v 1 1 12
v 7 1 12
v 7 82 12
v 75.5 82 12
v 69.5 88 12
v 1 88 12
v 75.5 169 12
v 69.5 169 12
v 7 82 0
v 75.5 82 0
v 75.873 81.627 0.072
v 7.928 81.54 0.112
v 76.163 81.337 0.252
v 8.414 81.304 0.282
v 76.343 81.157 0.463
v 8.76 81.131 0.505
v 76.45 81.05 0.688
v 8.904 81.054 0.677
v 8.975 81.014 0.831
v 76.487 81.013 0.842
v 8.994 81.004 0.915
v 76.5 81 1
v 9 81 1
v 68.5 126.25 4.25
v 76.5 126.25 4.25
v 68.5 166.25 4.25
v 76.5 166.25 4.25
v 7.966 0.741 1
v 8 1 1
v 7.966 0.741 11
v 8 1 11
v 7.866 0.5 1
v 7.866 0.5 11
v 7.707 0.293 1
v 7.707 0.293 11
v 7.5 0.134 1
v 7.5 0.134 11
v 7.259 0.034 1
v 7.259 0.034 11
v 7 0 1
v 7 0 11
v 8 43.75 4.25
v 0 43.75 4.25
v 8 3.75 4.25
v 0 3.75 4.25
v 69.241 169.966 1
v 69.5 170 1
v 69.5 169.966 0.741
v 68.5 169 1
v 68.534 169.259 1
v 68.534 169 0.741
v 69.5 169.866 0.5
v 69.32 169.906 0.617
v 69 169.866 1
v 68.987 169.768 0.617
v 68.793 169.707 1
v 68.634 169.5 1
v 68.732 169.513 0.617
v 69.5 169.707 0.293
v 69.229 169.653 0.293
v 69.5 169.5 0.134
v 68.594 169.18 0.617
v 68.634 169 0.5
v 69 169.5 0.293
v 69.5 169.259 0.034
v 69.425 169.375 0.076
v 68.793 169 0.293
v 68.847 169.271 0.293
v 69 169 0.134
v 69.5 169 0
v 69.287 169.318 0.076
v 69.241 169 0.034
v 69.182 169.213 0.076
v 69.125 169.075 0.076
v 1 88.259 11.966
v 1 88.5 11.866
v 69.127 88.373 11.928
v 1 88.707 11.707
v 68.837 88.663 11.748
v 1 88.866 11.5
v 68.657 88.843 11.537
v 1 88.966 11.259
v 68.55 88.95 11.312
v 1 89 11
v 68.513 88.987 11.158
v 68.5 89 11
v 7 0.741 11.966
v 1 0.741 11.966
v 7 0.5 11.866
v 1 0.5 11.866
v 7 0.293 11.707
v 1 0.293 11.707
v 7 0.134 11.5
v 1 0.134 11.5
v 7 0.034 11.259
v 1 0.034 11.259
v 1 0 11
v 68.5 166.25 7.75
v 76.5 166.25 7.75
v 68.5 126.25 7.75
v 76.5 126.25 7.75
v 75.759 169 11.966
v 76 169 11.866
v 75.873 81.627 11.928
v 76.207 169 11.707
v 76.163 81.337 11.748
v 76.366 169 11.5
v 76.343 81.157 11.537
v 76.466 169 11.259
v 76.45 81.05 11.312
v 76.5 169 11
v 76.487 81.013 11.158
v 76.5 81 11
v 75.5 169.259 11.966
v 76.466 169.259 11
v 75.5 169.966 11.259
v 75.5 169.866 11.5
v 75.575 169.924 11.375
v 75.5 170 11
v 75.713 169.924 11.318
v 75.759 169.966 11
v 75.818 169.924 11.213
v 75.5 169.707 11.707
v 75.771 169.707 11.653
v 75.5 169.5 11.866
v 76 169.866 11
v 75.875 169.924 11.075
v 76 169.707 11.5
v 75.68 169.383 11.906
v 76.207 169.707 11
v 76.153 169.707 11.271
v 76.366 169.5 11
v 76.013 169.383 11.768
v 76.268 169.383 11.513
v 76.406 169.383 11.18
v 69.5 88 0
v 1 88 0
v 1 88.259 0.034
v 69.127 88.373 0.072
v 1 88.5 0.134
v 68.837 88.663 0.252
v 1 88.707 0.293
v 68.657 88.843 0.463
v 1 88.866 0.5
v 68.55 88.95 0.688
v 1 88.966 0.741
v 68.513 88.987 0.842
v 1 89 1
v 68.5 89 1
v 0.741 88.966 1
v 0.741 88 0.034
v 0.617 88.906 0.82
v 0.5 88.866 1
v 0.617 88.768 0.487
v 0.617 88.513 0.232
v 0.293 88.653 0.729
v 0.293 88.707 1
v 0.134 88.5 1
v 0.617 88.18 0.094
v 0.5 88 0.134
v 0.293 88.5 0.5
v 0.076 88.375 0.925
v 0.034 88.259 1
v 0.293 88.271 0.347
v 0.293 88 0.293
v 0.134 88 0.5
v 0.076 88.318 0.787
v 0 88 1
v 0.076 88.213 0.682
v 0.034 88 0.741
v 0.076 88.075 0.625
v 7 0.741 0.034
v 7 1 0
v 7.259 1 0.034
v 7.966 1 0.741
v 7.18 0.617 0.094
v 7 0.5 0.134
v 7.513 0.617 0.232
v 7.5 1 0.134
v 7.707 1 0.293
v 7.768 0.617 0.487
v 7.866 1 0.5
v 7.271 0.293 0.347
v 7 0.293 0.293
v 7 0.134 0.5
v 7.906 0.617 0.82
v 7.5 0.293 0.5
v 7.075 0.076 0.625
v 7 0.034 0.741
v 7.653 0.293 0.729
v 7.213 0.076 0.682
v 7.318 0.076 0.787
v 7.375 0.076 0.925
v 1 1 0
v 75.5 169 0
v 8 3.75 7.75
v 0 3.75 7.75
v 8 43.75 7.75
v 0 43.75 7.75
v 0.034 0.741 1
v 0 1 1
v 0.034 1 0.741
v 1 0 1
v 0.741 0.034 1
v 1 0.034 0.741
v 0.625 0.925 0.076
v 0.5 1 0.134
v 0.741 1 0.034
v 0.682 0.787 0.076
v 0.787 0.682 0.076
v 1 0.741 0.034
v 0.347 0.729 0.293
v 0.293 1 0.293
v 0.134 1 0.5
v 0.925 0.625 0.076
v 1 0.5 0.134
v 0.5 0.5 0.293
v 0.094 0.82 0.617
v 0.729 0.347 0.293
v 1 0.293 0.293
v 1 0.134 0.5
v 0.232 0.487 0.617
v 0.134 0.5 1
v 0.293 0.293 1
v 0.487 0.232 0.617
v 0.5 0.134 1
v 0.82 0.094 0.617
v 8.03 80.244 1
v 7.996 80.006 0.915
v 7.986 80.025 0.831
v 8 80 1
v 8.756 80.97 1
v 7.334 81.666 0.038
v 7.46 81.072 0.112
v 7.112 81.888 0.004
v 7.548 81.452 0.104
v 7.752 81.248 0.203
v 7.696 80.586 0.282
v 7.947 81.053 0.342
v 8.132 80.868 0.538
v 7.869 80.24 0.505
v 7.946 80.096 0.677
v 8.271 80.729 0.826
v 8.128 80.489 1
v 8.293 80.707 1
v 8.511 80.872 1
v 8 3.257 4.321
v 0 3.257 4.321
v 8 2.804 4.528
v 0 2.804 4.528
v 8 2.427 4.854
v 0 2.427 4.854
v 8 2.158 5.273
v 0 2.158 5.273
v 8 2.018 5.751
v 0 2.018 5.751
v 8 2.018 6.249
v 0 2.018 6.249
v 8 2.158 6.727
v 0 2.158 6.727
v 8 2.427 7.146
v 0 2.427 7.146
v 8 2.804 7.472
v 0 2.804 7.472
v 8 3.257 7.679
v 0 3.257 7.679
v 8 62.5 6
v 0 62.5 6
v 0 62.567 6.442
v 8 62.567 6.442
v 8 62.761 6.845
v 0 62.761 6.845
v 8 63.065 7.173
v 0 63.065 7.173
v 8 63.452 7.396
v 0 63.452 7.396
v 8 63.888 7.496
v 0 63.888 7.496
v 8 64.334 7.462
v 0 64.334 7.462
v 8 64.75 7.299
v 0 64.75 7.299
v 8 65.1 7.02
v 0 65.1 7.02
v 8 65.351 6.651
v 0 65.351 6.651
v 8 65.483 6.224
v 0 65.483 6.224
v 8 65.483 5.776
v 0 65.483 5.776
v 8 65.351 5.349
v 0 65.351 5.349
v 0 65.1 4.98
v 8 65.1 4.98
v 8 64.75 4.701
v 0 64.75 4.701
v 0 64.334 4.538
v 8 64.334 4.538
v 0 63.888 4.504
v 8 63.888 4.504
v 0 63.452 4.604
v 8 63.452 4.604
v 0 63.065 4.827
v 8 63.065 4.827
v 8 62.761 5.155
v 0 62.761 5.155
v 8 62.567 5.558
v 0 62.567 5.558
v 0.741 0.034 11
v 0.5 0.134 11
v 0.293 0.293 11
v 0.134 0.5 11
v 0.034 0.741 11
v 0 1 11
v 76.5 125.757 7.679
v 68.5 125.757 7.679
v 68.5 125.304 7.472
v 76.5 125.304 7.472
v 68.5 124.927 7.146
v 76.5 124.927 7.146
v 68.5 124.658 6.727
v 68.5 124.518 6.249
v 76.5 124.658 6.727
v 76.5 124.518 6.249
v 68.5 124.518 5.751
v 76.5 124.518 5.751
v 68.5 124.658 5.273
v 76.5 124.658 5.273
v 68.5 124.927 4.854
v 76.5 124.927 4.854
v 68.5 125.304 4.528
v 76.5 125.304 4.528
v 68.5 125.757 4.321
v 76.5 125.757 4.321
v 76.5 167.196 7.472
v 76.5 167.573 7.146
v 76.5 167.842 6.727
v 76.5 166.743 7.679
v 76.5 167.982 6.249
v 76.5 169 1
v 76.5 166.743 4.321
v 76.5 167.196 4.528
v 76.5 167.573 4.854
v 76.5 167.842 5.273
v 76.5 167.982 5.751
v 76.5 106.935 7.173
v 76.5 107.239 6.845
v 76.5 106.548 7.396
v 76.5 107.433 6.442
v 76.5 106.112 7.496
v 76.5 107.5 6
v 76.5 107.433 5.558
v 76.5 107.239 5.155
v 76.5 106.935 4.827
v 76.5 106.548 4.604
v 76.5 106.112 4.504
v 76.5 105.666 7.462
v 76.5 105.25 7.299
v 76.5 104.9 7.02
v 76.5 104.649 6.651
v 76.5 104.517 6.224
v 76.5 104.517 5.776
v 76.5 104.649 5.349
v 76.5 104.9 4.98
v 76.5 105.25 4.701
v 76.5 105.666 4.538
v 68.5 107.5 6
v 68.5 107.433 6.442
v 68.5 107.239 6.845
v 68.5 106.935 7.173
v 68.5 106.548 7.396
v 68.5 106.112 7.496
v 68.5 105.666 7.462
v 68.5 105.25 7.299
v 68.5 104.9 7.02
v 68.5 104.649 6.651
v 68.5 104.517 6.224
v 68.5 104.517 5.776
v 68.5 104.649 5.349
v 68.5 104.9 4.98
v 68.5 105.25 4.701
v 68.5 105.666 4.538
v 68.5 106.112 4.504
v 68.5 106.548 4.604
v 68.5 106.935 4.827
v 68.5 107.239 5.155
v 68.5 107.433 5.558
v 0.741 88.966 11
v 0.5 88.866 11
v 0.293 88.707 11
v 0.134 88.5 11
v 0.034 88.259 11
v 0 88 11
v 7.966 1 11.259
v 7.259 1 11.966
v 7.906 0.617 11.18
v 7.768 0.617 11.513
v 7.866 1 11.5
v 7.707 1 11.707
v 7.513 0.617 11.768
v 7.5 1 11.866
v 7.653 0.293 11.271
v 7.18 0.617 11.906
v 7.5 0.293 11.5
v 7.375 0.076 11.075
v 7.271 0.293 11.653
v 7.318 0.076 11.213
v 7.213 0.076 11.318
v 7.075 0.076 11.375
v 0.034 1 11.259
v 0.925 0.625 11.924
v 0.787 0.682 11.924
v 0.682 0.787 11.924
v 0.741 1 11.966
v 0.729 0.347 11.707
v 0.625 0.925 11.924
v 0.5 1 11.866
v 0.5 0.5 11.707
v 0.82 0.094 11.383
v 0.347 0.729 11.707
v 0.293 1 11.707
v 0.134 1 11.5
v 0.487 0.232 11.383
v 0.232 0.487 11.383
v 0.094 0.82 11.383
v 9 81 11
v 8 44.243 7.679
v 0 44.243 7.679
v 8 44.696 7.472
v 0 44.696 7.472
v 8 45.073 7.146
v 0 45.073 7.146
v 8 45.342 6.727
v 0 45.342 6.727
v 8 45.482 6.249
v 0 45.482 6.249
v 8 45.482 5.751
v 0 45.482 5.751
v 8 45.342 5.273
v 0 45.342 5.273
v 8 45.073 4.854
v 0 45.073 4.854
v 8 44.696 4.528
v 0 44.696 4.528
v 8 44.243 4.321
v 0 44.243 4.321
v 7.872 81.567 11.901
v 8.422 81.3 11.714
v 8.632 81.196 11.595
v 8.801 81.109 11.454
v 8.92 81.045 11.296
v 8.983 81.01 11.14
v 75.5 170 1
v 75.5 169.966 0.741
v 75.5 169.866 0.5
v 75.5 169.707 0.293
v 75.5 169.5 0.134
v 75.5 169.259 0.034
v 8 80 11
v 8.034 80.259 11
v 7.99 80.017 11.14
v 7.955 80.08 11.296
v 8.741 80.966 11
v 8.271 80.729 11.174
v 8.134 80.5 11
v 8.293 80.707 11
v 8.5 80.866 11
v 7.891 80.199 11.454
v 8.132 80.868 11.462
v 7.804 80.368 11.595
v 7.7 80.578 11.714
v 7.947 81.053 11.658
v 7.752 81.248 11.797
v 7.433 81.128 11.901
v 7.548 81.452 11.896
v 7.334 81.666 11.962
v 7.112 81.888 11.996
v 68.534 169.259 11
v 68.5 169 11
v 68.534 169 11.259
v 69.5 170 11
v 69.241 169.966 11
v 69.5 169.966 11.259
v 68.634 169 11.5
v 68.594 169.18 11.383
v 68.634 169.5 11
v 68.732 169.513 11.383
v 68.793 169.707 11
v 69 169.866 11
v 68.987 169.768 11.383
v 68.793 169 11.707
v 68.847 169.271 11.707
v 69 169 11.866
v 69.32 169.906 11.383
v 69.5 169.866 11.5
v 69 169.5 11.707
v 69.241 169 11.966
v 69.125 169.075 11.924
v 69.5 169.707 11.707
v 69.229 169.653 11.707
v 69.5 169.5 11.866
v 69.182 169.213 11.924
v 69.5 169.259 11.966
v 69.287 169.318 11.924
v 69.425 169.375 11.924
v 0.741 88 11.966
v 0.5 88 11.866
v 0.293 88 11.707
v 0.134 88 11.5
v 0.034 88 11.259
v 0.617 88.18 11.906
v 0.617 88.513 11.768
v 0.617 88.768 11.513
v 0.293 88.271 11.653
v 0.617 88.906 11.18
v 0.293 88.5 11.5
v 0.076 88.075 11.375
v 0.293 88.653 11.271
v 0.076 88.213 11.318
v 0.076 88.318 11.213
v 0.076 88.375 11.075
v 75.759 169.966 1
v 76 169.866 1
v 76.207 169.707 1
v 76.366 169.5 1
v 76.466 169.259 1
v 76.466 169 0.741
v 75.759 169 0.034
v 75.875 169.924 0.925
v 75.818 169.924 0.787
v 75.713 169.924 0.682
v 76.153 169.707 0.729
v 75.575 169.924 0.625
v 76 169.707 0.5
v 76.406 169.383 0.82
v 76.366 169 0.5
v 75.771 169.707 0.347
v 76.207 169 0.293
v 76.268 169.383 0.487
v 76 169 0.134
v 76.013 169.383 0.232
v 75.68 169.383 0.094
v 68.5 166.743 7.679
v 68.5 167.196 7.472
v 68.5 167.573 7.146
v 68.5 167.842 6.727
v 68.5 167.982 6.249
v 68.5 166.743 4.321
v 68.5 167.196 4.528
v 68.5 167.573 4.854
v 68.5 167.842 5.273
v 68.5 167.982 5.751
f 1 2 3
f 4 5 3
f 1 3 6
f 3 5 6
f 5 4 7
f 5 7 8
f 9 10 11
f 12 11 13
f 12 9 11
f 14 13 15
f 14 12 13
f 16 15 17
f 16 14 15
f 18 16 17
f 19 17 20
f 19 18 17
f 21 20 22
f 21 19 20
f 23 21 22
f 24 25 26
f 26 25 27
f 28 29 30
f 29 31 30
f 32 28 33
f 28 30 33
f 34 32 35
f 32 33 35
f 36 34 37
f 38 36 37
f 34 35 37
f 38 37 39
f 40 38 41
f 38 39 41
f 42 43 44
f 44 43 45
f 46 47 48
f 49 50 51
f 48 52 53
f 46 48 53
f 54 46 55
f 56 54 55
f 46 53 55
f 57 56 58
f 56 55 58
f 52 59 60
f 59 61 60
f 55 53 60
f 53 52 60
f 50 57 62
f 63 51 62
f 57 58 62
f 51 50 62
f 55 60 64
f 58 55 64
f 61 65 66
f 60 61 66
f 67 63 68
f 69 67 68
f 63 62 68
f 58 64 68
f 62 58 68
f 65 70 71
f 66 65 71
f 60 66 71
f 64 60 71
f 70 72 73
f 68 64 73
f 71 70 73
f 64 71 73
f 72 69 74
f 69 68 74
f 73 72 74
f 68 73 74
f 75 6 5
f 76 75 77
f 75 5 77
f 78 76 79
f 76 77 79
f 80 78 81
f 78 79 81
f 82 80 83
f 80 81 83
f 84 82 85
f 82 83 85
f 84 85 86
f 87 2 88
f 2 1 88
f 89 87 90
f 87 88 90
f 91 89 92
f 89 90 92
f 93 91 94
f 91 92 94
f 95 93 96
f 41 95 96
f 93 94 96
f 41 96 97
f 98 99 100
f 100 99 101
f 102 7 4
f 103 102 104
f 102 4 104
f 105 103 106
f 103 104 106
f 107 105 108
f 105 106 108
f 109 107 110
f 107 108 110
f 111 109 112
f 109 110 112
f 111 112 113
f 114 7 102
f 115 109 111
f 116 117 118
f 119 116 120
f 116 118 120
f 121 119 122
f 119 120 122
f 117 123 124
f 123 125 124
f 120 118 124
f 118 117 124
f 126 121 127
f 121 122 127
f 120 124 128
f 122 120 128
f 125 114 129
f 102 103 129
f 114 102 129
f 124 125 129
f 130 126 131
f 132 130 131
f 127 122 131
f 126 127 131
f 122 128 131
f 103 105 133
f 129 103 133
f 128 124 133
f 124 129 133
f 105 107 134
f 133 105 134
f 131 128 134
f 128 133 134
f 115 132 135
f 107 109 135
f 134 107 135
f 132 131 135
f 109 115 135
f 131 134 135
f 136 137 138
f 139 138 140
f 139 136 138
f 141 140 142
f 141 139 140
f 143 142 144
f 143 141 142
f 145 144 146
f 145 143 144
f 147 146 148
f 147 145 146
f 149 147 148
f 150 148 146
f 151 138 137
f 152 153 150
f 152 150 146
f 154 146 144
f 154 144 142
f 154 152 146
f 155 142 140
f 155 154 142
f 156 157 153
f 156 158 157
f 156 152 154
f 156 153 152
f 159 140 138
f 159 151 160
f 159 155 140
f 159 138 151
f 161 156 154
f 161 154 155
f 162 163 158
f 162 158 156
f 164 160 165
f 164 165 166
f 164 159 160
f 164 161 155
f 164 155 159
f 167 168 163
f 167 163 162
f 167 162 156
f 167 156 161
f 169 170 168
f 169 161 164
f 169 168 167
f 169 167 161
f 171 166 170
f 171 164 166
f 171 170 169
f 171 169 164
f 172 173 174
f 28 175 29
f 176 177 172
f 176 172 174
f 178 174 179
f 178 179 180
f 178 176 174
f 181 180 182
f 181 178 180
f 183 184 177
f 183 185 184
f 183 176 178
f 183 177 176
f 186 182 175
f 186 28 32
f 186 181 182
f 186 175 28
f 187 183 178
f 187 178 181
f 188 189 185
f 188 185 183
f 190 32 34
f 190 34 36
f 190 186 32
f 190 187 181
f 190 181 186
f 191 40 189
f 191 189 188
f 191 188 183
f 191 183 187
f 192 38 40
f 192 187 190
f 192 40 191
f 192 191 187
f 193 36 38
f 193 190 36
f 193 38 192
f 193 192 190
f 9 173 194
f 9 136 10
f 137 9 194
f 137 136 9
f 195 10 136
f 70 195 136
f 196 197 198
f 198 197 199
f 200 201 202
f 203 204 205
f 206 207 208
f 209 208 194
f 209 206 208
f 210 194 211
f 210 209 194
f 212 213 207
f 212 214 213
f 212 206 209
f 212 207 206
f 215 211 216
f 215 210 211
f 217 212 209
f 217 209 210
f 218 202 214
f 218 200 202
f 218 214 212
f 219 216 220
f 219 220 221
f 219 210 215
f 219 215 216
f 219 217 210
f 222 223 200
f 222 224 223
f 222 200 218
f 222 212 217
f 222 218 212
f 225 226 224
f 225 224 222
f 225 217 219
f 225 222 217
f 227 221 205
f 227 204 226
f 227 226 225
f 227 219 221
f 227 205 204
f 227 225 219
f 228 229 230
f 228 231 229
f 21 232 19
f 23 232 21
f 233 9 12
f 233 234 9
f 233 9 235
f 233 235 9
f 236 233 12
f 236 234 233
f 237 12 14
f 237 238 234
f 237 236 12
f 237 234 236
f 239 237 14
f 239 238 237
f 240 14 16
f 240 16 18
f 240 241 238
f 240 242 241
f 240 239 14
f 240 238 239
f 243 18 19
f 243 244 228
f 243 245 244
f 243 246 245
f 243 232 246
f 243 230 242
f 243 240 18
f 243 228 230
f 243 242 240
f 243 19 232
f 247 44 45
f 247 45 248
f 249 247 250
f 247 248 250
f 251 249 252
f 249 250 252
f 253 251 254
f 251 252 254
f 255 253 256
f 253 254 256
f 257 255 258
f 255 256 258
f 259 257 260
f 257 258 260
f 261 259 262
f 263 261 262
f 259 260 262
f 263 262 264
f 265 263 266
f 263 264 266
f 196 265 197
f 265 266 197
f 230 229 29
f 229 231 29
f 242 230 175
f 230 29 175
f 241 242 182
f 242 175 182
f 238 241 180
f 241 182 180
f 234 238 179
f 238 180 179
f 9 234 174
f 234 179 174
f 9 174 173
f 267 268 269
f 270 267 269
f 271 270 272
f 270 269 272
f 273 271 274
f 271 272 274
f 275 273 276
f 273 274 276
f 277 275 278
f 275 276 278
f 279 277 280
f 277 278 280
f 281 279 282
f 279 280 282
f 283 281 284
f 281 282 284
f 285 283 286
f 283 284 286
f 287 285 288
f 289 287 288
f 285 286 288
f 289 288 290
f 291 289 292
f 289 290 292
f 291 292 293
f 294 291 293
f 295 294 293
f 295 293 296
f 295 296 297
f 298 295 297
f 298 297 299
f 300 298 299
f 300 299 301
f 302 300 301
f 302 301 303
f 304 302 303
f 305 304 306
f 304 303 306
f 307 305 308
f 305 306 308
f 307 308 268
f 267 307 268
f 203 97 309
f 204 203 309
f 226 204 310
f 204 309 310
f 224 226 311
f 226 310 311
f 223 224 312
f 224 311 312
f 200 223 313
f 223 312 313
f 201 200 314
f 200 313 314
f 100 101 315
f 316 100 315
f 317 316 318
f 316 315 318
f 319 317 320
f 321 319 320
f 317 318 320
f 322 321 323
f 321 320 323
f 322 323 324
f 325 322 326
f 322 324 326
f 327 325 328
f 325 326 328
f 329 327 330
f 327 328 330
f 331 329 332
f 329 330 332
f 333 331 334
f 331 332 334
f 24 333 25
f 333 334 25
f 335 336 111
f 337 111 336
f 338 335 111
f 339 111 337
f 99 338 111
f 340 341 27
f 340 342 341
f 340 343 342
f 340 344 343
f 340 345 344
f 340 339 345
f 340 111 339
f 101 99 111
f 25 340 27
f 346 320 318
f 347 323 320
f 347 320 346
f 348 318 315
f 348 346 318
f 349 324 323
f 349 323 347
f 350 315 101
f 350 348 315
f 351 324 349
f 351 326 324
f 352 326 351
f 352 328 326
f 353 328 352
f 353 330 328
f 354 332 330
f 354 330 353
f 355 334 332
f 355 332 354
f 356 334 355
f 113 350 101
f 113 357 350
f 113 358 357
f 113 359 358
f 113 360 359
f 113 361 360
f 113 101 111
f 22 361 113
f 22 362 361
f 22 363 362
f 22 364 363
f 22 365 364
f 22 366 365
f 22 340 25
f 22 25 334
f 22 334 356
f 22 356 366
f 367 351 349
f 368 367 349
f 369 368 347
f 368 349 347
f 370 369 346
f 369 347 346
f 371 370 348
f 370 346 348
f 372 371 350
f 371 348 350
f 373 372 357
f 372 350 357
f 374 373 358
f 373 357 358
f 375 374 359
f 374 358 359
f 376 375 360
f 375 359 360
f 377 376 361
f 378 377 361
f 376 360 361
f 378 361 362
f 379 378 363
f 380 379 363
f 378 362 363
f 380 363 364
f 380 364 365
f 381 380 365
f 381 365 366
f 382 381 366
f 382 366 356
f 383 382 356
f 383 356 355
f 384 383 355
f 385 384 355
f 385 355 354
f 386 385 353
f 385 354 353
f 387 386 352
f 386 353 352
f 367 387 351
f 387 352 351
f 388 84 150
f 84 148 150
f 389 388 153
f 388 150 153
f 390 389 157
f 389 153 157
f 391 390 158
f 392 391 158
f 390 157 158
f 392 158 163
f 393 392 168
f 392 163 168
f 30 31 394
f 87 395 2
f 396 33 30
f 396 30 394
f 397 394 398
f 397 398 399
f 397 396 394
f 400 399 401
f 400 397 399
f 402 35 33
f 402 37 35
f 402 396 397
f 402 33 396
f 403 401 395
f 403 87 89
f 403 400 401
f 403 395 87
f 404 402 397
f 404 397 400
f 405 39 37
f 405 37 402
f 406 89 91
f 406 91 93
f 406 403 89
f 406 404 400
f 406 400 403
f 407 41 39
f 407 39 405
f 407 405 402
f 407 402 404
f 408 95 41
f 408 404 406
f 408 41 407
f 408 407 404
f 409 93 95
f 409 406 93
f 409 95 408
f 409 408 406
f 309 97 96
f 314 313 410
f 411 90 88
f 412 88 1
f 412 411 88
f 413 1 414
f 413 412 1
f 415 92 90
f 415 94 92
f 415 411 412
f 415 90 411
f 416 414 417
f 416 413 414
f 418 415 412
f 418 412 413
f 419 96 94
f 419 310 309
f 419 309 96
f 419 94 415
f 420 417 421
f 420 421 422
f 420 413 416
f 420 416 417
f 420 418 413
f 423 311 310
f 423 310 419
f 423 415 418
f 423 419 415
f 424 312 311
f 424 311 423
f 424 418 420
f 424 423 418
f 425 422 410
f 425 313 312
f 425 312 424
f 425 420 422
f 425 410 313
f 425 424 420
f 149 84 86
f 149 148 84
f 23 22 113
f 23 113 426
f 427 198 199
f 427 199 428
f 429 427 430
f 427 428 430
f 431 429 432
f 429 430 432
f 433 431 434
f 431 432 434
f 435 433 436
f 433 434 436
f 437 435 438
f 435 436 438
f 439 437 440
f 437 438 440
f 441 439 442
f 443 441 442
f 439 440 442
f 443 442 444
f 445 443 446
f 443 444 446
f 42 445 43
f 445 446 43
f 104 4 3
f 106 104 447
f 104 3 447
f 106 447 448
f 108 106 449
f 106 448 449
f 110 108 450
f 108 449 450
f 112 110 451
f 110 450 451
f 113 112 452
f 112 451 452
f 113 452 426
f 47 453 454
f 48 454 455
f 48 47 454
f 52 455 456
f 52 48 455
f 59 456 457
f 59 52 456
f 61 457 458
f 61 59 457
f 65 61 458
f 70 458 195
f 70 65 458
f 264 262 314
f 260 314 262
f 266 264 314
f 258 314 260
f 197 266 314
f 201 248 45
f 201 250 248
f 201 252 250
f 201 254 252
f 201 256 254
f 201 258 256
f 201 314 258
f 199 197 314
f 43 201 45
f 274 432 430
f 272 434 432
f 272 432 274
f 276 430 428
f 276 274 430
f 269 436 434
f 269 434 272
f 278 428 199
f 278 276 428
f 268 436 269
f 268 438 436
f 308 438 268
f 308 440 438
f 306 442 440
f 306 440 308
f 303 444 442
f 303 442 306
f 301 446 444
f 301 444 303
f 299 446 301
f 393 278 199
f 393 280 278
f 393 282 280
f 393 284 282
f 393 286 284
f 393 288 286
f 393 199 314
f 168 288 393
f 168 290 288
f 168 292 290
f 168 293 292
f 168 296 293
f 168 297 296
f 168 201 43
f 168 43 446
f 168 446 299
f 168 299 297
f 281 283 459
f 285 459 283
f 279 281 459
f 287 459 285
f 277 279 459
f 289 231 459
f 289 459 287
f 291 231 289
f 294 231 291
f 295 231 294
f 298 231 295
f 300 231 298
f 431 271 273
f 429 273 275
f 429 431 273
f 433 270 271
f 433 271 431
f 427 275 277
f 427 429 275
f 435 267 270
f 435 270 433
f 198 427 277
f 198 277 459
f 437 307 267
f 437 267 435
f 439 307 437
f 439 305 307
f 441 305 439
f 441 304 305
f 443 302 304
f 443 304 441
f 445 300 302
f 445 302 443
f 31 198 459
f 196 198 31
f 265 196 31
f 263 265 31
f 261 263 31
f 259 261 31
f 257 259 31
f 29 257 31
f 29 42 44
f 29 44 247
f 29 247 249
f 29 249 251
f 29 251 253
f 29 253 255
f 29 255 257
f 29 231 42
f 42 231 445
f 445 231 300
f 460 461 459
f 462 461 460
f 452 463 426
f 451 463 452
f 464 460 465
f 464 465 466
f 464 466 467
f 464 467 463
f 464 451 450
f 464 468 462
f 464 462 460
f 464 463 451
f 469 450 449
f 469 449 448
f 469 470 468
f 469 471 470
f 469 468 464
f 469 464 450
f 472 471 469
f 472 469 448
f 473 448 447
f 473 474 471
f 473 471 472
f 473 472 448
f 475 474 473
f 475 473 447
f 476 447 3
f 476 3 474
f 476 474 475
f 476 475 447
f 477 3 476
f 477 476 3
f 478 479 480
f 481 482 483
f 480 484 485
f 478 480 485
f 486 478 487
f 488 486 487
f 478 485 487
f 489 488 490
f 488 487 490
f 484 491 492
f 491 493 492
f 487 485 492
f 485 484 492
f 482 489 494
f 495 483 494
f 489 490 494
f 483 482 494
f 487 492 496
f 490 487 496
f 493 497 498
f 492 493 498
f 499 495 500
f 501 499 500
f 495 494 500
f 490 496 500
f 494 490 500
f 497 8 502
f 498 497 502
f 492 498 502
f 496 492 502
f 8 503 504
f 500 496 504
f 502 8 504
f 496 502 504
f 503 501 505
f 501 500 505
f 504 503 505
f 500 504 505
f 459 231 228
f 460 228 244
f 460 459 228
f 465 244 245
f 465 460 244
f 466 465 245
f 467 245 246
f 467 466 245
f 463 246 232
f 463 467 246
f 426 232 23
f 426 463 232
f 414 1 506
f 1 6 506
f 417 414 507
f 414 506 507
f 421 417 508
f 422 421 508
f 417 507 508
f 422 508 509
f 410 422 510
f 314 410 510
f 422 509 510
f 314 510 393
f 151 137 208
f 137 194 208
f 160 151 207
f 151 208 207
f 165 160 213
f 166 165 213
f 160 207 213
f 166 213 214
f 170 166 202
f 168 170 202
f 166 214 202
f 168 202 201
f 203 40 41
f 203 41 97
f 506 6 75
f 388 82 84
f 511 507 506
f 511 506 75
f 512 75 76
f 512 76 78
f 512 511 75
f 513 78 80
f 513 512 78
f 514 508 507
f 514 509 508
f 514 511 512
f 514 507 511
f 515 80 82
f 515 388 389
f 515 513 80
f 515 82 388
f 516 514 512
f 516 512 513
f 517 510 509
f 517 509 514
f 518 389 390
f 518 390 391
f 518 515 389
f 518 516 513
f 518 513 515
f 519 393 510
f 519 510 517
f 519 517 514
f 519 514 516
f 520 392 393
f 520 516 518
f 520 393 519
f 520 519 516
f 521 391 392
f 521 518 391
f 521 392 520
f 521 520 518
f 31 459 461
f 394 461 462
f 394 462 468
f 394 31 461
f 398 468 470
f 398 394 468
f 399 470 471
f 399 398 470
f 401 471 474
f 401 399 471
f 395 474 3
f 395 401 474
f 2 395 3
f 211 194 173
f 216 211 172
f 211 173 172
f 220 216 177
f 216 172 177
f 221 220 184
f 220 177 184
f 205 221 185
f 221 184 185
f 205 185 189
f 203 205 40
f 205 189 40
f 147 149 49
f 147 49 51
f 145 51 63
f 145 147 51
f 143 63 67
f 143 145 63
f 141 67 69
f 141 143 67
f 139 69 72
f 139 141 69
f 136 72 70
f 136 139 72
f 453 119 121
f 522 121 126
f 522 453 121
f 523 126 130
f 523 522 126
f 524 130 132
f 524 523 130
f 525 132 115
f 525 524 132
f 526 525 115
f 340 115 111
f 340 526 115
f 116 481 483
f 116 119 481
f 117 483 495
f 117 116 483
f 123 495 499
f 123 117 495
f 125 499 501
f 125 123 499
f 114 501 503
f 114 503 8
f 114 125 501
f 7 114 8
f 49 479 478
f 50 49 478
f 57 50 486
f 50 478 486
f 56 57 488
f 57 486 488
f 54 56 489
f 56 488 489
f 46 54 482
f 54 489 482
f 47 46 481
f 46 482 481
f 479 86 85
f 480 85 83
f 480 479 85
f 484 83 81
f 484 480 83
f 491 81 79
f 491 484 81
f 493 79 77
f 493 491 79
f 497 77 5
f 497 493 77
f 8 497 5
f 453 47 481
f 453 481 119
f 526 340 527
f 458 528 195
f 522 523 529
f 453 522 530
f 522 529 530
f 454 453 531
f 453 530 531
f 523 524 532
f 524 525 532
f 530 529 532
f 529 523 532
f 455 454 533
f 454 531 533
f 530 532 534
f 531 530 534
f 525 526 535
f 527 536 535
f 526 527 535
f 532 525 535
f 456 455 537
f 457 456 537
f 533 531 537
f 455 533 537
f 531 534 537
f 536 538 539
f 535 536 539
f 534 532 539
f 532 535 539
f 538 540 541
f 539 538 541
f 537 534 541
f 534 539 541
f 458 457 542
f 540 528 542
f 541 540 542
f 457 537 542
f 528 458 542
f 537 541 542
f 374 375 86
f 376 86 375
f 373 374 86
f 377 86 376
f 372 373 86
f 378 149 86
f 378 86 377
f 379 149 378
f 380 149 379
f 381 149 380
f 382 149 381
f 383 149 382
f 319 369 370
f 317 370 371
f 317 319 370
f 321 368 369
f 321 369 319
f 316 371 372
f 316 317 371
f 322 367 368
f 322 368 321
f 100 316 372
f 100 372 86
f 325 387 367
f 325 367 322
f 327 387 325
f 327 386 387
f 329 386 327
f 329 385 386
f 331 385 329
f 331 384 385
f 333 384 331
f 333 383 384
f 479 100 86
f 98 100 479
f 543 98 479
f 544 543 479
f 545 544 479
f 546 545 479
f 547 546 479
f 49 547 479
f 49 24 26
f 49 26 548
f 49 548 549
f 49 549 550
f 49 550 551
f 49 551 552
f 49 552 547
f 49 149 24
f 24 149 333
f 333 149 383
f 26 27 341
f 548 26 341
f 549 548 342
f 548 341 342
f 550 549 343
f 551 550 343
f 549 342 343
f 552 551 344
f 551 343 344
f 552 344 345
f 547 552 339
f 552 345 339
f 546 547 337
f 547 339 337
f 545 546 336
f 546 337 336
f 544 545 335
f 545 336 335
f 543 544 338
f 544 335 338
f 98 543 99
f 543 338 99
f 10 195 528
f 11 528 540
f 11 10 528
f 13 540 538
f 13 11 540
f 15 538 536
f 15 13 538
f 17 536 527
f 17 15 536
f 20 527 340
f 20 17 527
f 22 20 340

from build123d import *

# Parameters (mm, degrees)
PAD_DEPTH       = 12
POCKET_DEPTH    = 8
SKETCH002_R     = 1.5
POCKET001_DEPTH = 8
SKETCH003_R     = 1.5
POCKET002_DEPTH = 8
FILLET_R        = 1
FILLET001_R     = 1
FILLET002_R     = 1
FILLET003_R     = 1
FILLET004_R     = 1
FILLET005_R     = 1
FILLET006_R     = 1
FILLET007_R     = 1


with BuildPart() as part:
    # Sketch → Pad (new body)
    with BuildSketch(Plane.XY):
        Polygon((8, 0), (0, 0), (0, 89), (68.5, 89), (68.5, 170), (76.5, 170), (76.5, 81), (8, 81), align=None)
    extrude(amount=PAD_DEPTH)

    # Sketch001 (on Face2 of Pad) → Pocket (cut)
    with BuildSketch(Plane(origin=(0, 0, 0), x_dir=(0, -1, 0), z_dir=(-1, 0, 0))):
        with BuildLine():
            ThreePointArc((-43.75, 7.75), (-45.5, 6), (-43.75, 4.25))
            Line((-43.75, 4.25), (-3.75, 4.25))
            ThreePointArc((-3.75, 4.25), (-2, 6), (-3.75, 7.75))
            Line((-3.75, 7.75), (-43.75, 7.75))
        make_face()
    extrude(amount=-POCKET_DEPTH, mode=Mode.SUBTRACT)

    # Sketch002 (on Face3 of Pocket) → Pocket001 (cut)
    with BuildSketch(Plane(origin=(0, 0, 0), x_dir=(0, -1, 0), z_dir=(-1, 0, 0))):
        with Locations((-64, 6)):
            Circle(SKETCH002_R)
    extrude(amount=-POCKET001_DEPTH, mode=Mode.SUBTRACT)

    # Sketch003 (on Face15 of Pocket001) → Pocket002 (cut)
    with BuildSketch(Plane.YZ.offset(76.5)):
        with Locations((106, 6)):
            Circle(SKETCH003_R)
        with BuildLine():
            ThreePointArc((126.25, 7.75), (124.5, 6), (126.25, 4.25))
            Line((126.25, 4.25), (166.25, 4.25))
            ThreePointArc((166.25, 4.25), (168, 6), (166.25, 7.75))
            Line((166.25, 7.75), (126.25, 7.75))
        make_face()
    extrude(amount=-POCKET002_DEPTH, mode=Mode.SUBTRACT)

    # Fillet
    fillet_edges = [part.edges().sort_by_distance(p)[0] for p in [
        (76.5, 125.5, 0),
        (42.25, 81, 0),
        (8, 40.5, 0),
        (8, 40.5, 12),
        (42.25, 81, 12),
        (76.5, 125.5, 12),
    ]]
    fillet(fillet_edges, radius=FILLET_R)

    # Fillet001
    fillet001_edges = [part.edges().sort_by_distance(p)[0] for p in [
        (68.5, 170, 6),
    ]]
    fillet(fillet001_edges, radius=FILLET001_R)

    # Fillet002
    fillet002_edges = [part.edges().sort_by_distance(p)[0] for p in [
        (68.5, 129, 12),
    ]]
    fillet(fillet002_edges, radius=FILLET002_R)

    # Fillet003
    fillet003_edges = [part.edges().sort_by_distance(p)[0] for p in [
        (34.25, 89, 0),
    ]]
    fillet(fillet003_edges, radius=FILLET003_R)

    # Fillet004
    fillet004_edges = [part.edges().sort_by_distance(p)[0] for p in [
        (34.25, 89, 12),
    ]]
    fillet(fillet004_edges, radius=FILLET004_R)

    # Fillet005
    fillet005_edges = [part.edges().sort_by_distance(p)[0] for p in [
        (0, 0, 6),
    ]]
    fillet(fillet005_edges, radius=FILLET005_R)

    # Fillet006
    fillet006_edges = [part.edges().sort_by_distance(p)[0] for p in [
        (0, 44.5, 12),
    ]]
    fillet(fillet006_edges, radius=FILLET006_R)

    # Fillet007
    fillet007_edges = [part.edges().sort_by_distance(p)[0] for p in [
        (8, 81, 6),
    ]]
    fillet(fillet007_edges, radius=FILLET007_R)


solid = part.part
